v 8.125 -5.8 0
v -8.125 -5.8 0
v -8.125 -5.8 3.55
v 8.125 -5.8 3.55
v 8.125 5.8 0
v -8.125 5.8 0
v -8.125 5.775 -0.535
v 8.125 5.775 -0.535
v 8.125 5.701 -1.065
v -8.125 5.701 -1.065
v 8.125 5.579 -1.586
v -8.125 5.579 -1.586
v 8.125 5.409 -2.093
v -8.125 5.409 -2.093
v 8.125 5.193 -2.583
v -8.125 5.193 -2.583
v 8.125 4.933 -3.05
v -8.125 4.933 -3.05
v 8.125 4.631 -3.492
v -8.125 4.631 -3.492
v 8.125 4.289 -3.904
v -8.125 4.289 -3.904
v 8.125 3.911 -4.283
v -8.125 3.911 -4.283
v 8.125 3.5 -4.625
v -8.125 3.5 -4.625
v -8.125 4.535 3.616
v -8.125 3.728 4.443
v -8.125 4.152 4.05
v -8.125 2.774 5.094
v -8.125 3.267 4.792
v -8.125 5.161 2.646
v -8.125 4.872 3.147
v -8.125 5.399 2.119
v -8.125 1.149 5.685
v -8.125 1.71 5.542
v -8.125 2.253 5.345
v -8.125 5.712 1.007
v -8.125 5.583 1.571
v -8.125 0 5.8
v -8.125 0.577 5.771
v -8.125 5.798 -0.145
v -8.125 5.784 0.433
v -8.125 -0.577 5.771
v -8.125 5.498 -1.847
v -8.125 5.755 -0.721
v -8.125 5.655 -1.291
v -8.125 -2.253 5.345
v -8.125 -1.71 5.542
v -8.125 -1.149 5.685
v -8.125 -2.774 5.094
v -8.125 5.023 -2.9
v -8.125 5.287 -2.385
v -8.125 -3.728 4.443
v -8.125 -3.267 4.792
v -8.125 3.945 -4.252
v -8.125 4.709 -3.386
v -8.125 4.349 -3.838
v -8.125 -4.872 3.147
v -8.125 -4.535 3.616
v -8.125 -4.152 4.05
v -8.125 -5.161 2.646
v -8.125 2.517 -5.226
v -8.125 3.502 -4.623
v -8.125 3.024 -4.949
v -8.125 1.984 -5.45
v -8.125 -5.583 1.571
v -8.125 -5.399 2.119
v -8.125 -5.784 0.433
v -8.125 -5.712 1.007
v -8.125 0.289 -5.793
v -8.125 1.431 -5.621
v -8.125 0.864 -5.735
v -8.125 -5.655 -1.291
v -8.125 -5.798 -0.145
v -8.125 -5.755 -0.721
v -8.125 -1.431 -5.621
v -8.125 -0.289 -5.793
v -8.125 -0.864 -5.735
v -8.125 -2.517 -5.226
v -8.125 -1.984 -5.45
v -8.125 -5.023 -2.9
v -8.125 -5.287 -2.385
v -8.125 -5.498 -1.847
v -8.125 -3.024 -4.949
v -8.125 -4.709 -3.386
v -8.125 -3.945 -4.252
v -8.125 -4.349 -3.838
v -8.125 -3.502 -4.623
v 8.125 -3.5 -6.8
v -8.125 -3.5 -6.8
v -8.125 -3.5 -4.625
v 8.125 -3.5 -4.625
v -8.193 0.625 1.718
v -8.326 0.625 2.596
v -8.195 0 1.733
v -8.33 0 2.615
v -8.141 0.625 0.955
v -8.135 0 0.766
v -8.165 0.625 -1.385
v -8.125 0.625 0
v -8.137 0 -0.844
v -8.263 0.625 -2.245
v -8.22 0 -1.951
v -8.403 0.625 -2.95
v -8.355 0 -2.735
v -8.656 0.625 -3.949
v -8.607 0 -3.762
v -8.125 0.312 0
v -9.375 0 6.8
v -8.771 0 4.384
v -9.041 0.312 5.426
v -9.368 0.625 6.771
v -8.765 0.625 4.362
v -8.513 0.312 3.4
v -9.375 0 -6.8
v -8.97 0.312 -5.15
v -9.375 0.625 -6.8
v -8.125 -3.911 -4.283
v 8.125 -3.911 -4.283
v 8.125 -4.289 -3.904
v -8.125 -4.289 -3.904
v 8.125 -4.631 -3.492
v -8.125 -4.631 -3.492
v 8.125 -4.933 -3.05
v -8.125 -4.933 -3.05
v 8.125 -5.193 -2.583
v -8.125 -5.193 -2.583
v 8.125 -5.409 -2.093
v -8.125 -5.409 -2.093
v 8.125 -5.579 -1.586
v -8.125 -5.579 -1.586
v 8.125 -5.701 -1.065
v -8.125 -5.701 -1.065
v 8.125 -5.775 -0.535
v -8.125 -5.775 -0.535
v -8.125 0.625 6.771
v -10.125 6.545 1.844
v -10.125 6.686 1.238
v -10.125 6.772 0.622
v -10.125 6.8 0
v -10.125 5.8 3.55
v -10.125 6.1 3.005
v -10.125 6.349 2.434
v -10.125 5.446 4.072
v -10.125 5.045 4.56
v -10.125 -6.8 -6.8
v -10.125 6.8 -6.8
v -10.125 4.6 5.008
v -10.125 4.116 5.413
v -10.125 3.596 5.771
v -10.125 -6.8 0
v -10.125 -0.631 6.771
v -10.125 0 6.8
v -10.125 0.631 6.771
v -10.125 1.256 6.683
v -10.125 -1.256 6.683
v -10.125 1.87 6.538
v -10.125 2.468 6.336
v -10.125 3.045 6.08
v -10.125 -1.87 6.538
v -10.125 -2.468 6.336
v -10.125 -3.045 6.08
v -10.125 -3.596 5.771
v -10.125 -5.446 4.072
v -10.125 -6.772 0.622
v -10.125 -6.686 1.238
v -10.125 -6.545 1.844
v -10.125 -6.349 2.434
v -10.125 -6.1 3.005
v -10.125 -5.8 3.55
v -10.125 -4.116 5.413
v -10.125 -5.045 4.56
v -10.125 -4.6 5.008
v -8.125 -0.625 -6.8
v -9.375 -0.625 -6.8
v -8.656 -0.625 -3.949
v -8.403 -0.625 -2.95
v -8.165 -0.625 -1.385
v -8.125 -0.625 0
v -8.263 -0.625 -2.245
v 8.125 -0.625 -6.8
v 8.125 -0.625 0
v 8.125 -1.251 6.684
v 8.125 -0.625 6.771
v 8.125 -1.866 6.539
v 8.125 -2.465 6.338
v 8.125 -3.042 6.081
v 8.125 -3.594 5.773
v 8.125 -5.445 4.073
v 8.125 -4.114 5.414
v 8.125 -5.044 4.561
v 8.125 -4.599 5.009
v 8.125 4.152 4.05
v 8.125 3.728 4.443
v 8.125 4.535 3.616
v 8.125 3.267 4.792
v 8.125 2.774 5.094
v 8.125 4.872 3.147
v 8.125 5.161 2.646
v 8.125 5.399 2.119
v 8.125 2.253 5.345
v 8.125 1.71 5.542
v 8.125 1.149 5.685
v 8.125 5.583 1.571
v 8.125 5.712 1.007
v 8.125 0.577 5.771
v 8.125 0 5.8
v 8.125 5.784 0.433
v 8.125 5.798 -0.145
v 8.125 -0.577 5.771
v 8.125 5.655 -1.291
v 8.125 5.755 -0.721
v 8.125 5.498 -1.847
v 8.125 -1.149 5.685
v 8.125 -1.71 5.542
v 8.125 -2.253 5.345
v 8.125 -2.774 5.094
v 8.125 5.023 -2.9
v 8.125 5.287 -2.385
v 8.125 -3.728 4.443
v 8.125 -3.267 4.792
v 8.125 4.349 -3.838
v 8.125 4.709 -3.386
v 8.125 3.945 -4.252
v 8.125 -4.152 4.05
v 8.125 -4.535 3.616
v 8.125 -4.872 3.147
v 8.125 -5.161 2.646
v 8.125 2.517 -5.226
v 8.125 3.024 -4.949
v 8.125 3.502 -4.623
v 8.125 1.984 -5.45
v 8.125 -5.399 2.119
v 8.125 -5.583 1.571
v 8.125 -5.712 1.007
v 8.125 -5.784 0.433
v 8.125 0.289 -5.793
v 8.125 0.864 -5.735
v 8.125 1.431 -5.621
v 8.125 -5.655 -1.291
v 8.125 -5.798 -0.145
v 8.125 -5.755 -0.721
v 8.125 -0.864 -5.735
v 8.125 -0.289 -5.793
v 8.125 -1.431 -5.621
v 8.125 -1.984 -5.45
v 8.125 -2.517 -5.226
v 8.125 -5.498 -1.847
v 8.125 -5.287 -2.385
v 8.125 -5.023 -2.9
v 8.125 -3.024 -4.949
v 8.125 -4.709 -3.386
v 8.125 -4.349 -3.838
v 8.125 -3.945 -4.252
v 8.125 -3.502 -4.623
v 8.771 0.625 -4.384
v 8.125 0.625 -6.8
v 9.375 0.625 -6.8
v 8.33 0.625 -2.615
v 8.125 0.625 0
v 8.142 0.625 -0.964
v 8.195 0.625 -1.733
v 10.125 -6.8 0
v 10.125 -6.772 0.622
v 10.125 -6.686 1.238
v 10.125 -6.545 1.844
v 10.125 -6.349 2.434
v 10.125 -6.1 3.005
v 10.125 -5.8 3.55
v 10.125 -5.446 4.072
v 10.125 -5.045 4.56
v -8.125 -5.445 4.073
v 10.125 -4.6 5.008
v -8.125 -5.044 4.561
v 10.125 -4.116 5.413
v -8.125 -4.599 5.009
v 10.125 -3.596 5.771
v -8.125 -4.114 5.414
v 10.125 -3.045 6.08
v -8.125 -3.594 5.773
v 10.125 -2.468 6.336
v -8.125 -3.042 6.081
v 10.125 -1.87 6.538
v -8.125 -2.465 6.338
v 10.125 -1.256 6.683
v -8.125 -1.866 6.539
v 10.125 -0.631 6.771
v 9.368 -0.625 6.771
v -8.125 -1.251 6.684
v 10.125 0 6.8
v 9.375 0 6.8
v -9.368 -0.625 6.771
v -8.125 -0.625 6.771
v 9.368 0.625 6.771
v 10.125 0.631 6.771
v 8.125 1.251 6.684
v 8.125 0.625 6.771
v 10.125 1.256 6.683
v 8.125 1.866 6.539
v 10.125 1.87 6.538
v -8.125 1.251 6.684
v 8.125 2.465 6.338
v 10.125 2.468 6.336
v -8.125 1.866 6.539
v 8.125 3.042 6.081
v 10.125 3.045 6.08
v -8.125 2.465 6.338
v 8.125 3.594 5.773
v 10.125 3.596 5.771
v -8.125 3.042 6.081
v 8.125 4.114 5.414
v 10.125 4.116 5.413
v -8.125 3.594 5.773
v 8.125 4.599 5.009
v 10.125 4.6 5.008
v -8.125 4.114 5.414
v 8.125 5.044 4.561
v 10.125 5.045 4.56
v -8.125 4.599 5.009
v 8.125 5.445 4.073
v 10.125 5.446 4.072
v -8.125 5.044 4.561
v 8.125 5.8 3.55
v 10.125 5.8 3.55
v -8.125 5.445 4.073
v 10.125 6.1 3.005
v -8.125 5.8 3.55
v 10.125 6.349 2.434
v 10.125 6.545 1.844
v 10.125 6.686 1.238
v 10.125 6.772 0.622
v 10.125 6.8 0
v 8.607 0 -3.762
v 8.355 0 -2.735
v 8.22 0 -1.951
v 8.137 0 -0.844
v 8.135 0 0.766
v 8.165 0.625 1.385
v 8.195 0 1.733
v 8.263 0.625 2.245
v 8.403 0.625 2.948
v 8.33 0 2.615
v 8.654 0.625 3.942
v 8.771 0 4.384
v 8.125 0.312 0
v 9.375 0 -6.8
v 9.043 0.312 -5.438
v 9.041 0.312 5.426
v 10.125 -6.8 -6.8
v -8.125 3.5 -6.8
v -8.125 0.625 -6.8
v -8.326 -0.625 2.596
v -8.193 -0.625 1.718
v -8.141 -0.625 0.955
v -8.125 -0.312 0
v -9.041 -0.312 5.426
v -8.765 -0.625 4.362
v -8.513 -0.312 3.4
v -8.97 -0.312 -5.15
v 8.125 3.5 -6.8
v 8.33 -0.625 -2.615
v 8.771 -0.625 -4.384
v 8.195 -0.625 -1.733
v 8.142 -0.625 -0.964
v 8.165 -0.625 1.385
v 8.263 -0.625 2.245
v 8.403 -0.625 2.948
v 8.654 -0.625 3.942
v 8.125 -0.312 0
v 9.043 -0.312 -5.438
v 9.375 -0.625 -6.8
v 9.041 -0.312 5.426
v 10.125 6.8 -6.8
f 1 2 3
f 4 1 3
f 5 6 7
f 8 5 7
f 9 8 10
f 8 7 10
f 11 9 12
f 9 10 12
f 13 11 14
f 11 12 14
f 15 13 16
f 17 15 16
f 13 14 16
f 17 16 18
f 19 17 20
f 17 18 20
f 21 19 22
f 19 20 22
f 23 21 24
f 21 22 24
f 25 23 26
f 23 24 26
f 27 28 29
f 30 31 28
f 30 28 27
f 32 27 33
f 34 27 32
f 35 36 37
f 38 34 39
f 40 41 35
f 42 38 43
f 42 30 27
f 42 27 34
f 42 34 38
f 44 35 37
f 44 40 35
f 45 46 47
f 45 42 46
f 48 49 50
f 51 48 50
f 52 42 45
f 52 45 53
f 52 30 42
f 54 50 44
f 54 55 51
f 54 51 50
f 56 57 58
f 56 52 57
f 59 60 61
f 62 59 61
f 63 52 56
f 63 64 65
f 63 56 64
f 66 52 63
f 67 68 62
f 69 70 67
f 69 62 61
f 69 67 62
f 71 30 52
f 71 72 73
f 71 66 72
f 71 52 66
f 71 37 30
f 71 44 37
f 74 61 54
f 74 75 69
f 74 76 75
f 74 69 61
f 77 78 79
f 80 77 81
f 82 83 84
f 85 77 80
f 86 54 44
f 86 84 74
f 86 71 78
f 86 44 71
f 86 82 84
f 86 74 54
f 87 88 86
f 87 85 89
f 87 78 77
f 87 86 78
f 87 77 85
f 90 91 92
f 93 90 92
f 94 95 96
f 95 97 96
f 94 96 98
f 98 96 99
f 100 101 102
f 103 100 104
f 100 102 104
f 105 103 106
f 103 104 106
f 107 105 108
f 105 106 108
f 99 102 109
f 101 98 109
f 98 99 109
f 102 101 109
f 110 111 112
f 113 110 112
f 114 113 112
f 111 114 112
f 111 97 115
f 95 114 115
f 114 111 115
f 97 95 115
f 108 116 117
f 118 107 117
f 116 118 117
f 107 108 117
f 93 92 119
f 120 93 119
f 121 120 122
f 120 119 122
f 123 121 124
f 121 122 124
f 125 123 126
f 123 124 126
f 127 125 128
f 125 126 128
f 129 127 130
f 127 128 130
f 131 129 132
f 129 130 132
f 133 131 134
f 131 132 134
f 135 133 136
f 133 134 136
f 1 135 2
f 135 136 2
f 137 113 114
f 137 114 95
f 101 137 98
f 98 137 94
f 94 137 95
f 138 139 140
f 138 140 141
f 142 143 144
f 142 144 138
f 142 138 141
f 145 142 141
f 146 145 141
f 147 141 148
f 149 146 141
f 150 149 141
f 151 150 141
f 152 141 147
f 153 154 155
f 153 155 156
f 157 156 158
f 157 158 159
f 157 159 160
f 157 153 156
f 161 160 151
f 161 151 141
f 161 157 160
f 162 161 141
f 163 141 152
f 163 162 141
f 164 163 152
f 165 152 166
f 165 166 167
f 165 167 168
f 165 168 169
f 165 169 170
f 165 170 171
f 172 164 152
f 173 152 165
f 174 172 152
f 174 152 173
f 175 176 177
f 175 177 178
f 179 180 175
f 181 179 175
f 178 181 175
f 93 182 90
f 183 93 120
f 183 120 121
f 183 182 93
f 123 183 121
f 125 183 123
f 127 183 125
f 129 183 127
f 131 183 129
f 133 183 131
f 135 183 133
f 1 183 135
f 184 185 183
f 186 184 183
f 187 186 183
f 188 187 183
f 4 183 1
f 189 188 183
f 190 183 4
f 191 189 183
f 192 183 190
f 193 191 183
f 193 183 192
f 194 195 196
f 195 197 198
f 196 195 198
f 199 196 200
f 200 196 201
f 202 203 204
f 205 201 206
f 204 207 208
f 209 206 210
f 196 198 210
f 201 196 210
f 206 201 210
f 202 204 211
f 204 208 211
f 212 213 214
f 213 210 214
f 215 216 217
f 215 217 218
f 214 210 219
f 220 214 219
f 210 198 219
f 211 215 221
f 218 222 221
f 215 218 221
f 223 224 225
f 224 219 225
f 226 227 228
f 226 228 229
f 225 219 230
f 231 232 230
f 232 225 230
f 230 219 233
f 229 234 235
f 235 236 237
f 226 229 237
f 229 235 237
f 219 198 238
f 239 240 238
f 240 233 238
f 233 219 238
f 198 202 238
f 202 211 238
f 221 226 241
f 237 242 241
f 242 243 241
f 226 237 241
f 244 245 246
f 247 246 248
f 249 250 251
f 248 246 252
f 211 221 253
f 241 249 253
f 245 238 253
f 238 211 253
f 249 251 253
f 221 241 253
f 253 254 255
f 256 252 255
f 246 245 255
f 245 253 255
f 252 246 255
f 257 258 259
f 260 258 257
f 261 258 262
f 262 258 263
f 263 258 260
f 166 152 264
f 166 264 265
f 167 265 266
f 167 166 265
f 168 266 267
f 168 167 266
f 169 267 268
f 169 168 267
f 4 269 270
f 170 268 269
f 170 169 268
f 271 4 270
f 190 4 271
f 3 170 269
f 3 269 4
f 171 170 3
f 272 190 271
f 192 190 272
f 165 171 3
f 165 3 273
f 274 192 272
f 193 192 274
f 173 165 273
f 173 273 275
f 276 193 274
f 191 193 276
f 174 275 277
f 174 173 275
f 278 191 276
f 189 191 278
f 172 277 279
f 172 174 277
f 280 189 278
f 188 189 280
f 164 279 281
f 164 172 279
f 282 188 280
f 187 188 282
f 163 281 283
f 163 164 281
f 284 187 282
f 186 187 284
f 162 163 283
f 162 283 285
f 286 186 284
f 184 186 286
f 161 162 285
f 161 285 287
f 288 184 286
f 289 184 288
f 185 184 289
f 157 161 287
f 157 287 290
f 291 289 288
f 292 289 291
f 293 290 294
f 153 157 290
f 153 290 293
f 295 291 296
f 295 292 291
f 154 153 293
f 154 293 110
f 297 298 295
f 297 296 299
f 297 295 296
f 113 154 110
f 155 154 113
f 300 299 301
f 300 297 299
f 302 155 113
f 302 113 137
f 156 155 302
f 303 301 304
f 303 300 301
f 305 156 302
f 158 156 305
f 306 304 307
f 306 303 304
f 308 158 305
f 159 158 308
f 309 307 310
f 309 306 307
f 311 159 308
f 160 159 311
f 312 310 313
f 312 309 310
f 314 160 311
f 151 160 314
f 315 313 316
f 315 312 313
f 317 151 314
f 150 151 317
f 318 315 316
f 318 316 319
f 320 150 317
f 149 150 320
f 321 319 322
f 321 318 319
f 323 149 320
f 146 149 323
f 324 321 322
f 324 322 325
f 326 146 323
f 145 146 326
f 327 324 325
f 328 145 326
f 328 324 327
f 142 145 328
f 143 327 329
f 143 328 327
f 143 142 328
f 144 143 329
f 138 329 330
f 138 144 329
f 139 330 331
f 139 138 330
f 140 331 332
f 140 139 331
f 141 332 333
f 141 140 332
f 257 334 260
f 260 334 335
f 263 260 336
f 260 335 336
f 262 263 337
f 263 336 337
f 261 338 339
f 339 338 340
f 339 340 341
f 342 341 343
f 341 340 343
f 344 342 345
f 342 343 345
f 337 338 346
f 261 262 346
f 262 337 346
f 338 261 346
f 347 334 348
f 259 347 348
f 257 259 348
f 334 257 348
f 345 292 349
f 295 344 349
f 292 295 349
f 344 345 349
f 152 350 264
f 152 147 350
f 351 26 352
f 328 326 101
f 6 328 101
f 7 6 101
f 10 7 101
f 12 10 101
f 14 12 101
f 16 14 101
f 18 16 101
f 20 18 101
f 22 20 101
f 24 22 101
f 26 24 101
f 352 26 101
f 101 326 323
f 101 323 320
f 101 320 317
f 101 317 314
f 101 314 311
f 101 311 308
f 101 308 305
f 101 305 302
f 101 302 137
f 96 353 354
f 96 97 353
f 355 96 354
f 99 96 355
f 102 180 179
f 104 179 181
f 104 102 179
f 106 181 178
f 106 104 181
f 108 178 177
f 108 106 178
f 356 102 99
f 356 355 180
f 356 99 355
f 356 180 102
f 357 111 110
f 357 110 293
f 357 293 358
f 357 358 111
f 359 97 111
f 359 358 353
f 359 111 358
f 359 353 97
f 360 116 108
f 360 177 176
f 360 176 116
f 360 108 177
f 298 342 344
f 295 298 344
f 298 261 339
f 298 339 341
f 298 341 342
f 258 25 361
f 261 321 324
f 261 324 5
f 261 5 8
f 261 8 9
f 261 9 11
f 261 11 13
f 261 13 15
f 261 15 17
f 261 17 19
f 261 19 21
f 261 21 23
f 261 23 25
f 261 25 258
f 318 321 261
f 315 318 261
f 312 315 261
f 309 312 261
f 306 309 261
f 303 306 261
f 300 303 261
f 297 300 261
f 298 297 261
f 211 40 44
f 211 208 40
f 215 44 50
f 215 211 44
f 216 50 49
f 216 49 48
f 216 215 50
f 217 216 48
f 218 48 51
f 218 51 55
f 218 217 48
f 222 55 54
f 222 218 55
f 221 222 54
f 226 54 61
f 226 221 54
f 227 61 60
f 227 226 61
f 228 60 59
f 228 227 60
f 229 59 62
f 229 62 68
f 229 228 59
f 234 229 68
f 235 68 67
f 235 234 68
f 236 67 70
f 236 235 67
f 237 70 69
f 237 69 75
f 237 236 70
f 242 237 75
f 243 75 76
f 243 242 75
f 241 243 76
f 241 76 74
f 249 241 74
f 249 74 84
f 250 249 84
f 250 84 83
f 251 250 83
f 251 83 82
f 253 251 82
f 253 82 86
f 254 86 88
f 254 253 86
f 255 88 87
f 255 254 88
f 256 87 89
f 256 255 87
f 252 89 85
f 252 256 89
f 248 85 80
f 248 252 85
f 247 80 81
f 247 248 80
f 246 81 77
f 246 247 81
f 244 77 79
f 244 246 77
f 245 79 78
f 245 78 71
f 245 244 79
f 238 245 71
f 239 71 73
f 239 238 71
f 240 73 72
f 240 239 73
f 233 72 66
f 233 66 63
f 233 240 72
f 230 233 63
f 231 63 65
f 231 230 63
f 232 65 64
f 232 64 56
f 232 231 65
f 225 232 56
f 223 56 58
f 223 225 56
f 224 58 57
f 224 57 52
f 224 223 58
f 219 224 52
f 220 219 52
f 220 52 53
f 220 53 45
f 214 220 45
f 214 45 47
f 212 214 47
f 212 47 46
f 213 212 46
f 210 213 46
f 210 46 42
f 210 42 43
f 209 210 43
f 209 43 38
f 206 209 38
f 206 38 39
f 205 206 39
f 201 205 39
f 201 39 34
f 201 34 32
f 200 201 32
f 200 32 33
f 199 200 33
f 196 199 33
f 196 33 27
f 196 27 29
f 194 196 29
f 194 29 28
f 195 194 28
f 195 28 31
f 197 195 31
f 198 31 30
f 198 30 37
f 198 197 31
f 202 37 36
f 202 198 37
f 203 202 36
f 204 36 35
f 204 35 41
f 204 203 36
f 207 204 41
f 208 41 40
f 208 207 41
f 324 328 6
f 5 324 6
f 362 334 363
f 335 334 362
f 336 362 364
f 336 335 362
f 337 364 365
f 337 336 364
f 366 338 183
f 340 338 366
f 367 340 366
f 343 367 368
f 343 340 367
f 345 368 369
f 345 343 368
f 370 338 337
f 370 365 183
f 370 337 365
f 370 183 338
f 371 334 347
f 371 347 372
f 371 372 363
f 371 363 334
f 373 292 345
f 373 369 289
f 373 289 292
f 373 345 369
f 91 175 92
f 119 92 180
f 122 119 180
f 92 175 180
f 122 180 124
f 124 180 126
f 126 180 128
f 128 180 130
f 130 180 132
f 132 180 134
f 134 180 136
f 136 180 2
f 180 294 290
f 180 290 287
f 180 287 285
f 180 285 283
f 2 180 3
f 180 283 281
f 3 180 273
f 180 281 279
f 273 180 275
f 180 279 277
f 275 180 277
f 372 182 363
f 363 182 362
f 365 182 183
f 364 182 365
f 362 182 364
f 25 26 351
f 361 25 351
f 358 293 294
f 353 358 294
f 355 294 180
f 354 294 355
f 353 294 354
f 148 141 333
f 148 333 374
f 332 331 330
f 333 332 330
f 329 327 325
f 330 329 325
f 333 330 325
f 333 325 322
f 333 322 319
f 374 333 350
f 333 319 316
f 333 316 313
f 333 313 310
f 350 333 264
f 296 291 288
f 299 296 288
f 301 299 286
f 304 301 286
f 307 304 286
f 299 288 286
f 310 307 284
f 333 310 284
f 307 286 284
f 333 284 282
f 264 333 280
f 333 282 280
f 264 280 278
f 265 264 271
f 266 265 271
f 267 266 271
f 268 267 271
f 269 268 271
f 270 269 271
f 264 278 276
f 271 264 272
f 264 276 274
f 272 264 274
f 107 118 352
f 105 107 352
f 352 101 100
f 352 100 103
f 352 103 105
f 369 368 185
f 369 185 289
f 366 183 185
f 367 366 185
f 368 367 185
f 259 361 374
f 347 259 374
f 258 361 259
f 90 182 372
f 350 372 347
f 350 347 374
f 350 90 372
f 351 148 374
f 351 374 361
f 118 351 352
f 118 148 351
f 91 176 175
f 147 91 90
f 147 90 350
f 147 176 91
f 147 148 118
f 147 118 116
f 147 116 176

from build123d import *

# Parameters (mm, degrees)
F0_W          = 16.25
F0_H          = 5.8
F3_DEPTH      = 2
F3_DEPTH_BACK = 18.25
F4_DEPTH      = 16.25
F6_DEPTH      = 0.625


with BuildPart() as f1:
    # F0 (on Front) → F1 (revolve)
    with BuildSketch(Plane.XZ):
        with Locations((0, 2.9)):
            Rectangle(F0_W, F0_H)
    revolve(axis=Axis((0, 0, 0), (1, 0, 0)))


with BuildPart() as f3:
    # F2 (on face) → F3 (new body, two sides)
    with BuildSketch(Plane(origin=(-8.125, 0, 0), x_dir=(0, -1, 0), z_dir=(-1, 0, 0))) as f3_sk:
        with BuildLine():
            Line((-3.5, -6.8), (3.5, -6.8))
            Line((3.5, -6.8), (3.5, -4.6249324319))
            ThreePointArc((3.5, -4.6249324319), (0, -5.8), (-3.5, -4.6249324319))
            Line((-3.5, -4.6249324319), (-3.5, -6.8))
        make_face()
        with BuildLine():
            Line((3.5, -6.8), (6.8, -6.8))
            Line((6.8, -6.8), (6.8, 0))
            ThreePointArc((6.8, 0), (6.5452272688, 1.8439088915), (5.8, 3.5496478699))
            Line((5.8, 3.5496478699), (5.8, 0))
            ThreePointArc((5.8, 0), (5.193264869, -2.582634314), (3.5, -4.6249324319))
            Line((3.5, -4.6249324319), (3.5, -6.8))
        make_face()
        with BuildLine():
            Line((-6.8, -6.8), (-3.5, -6.8))
            Line((-3.5, -6.8), (-3.5, -4.6249324319))
            ThreePointArc((-3.5, -4.6249324319), (-5.193264869, -2.582634314), (-5.8, 0))
            Line((-5.8, 0), (-5.8, 3.5496478699))
            ThreePointArc((-5.8, 3.5496478699), (-6.5452272688, 1.8439088915), (-6.8, 0))
            Line((-6.8, 0), (-6.8, -6.8))
        make_face()
        with BuildLine():
            Line((5.8, 0), (5.8, 3.5496478699))
            ThreePointArc((5.8, 3.5496478699), (3.3243341229, 5.9320150572), (4.08e-08, 6.8))
            ThreePointArc((4.08e-08, 6.8), (-3.3243340873, 5.9320150772), (-5.8, 3.5496478699))
            Line((-5.8, 3.5496478699), (-5.8, 0))
            ThreePointArc((-5.8, 0), (0, 5.8), (5.8, 0))
        make_face()
        with BuildLine():
            ThreePointArc((-3.5, -4.6249324319), (0, -5.8), (3.5, -4.6249324319))
            ThreePointArc((3.5, -4.6249324319), (5.193264869, -2.582634314), (5.8, 0))
            ThreePointArc((5.8, 0), (0, 5.8), (-5.8, 0))
            ThreePointArc((-5.8, 0), (-5.193264869, -2.582634314), (-3.5, -4.6249324319))
        make_face()
    extrude(amount=F3_DEPTH)
    extrude(f3_sk.sketch, amount=-F3_DEPTH_BACK)

    # F2 (on face) → F4 (cut, through all)
    with BuildSketch(Plane(origin=(-8.125, 0, 0), x_dir=(0, -1, 0), z_dir=(-1, 0, 0))):
        with BuildLine():
            ThreePointArc((-3.5, -4.6249324319), (0, -5.8), (3.5, -4.6249324319))
            ThreePointArc((3.5, -4.6249324319), (5.193264869, -2.582634314), (5.8, 0))
            ThreePointArc((5.8, 0), (0, 5.8), (-5.8, 0))
            ThreePointArc((-5.8, 0), (-5.193264869, -2.582634314), (-3.5, -4.6249324319))
        make_face()
        with BuildLine():
            Line((5.8, 0), (5.8, 3.5496478699))
            ThreePointArc((5.8, 3.5496478699), (3.3243341229, 5.9320150572), (4.08e-08, 6.8))
            ThreePointArc((4.08e-08, 6.8), (-3.3243340873, 5.9320150772), (-5.8, 3.5496478699))
            Line((-5.8, 3.5496478699), (-5.8, 0))
            ThreePointArc((-5.8, 0), (0, 5.8), (5.8, 0))
        make_face()
        with BuildLine():
            Line((-3.5, -6.8), (3.5, -6.8))
            Line((3.5, -6.8), (3.5, -4.6249324319))
            ThreePointArc((3.5, -4.6249324319), (0, -5.8), (-3.5, -4.6249324319))
            Line((-3.5, -4.6249324319), (-3.5, -6.8))
        make_face()
    extrude(amount=-F4_DEPTH, mode=Mode.SUBTRACT)

    # F5 (on Front) → F6 (cut, symmetric)
    with BuildSketch(Plane.XZ):
        with BuildLine():
            Line((-9.375, -6.8), (-8.125, -6.8))
            Line((-8.125, -6.8), (-8.125, -4.6249324319))
            Line((-8.125, -4.6249324319), (-8.125, 0))
            add(Edge.make_bspline(
                [(-8.125, 0), (-8.125, -2.7403182344), (-8.4223272721, -2.7403182344), (-9.375, -6.8)],
                knots=[0, 0, 0, 0, 6.9139352036, 6.9139352036, 6.9139352036, 6.9139352036], degree=3))
        make_face()
        Polygon((-8.125, -4.6249324319), (-8.125, -6.8), (8.125, -6.8), (8.125, -4.6249324319), (8.125, 0), (8.125, 3.5496478699), (8.125, 6.8), (-8.125, 6.8), (-8.125, 3.5496478699), (-8.125, 0), align=None)
        with BuildLine():
            Line((8.125, -4.6249324319), (8.125, -6.8))
            Line((8.125, -6.8), (9.375, -6.8))
            add(Edge.make_bspline(
                [(8.125, 0), (8.125, -2.7403182344), (8.4223272721, -2.7403182344), (9.375, -6.8)],
                knots=[0, 0, 0, 0, 6.9139352036, 6.9139352036, 6.9139352036, 6.9139352036], degree=3))
            Line((8.125, 0), (8.125, -4.6249324319))
        make_face()
        with BuildLine():
            add(Edge.make_bspline(
                [(-8.125, 0), (-8.125, 2.7403182344), (-8.4223272721, 2.7403182344), (-9.375, 6.8)],
                knots=[0, 0, 0, 0, 6.9139352036, 6.9139352036, 6.9139352036, 6.9139352036], degree=3))
            Line((-8.125, 0), (-8.125, 3.5496478699))
            Line((-8.125, 3.5496478699), (-8.125, 6.8))
            Line((-8.125, 6.8), (-9.375, 6.8))
        make_face()
        with BuildLine():
            Line((8.125, 3.5496478699), (8.125, 0))
            add(Edge.make_bspline(
                [(8.125, 0), (8.125, 2.7403182344), (8.4223272721, 2.7403182344), (9.375, 6.8)],
                knots=[0, 0, 0, 0, 6.9139352036, 6.9139352036, 6.9139352036, 6.9139352036], degree=3))
            Line((9.375, 6.8), (8.125, 6.8))
            Line((8.125, 6.8), (8.125, 3.5496478699))
        make_face()
    extrude(amount=F6_DEPTH, both=True, mode=Mode.SUBTRACT)


solid = Compound([f1.part, f3.part])
